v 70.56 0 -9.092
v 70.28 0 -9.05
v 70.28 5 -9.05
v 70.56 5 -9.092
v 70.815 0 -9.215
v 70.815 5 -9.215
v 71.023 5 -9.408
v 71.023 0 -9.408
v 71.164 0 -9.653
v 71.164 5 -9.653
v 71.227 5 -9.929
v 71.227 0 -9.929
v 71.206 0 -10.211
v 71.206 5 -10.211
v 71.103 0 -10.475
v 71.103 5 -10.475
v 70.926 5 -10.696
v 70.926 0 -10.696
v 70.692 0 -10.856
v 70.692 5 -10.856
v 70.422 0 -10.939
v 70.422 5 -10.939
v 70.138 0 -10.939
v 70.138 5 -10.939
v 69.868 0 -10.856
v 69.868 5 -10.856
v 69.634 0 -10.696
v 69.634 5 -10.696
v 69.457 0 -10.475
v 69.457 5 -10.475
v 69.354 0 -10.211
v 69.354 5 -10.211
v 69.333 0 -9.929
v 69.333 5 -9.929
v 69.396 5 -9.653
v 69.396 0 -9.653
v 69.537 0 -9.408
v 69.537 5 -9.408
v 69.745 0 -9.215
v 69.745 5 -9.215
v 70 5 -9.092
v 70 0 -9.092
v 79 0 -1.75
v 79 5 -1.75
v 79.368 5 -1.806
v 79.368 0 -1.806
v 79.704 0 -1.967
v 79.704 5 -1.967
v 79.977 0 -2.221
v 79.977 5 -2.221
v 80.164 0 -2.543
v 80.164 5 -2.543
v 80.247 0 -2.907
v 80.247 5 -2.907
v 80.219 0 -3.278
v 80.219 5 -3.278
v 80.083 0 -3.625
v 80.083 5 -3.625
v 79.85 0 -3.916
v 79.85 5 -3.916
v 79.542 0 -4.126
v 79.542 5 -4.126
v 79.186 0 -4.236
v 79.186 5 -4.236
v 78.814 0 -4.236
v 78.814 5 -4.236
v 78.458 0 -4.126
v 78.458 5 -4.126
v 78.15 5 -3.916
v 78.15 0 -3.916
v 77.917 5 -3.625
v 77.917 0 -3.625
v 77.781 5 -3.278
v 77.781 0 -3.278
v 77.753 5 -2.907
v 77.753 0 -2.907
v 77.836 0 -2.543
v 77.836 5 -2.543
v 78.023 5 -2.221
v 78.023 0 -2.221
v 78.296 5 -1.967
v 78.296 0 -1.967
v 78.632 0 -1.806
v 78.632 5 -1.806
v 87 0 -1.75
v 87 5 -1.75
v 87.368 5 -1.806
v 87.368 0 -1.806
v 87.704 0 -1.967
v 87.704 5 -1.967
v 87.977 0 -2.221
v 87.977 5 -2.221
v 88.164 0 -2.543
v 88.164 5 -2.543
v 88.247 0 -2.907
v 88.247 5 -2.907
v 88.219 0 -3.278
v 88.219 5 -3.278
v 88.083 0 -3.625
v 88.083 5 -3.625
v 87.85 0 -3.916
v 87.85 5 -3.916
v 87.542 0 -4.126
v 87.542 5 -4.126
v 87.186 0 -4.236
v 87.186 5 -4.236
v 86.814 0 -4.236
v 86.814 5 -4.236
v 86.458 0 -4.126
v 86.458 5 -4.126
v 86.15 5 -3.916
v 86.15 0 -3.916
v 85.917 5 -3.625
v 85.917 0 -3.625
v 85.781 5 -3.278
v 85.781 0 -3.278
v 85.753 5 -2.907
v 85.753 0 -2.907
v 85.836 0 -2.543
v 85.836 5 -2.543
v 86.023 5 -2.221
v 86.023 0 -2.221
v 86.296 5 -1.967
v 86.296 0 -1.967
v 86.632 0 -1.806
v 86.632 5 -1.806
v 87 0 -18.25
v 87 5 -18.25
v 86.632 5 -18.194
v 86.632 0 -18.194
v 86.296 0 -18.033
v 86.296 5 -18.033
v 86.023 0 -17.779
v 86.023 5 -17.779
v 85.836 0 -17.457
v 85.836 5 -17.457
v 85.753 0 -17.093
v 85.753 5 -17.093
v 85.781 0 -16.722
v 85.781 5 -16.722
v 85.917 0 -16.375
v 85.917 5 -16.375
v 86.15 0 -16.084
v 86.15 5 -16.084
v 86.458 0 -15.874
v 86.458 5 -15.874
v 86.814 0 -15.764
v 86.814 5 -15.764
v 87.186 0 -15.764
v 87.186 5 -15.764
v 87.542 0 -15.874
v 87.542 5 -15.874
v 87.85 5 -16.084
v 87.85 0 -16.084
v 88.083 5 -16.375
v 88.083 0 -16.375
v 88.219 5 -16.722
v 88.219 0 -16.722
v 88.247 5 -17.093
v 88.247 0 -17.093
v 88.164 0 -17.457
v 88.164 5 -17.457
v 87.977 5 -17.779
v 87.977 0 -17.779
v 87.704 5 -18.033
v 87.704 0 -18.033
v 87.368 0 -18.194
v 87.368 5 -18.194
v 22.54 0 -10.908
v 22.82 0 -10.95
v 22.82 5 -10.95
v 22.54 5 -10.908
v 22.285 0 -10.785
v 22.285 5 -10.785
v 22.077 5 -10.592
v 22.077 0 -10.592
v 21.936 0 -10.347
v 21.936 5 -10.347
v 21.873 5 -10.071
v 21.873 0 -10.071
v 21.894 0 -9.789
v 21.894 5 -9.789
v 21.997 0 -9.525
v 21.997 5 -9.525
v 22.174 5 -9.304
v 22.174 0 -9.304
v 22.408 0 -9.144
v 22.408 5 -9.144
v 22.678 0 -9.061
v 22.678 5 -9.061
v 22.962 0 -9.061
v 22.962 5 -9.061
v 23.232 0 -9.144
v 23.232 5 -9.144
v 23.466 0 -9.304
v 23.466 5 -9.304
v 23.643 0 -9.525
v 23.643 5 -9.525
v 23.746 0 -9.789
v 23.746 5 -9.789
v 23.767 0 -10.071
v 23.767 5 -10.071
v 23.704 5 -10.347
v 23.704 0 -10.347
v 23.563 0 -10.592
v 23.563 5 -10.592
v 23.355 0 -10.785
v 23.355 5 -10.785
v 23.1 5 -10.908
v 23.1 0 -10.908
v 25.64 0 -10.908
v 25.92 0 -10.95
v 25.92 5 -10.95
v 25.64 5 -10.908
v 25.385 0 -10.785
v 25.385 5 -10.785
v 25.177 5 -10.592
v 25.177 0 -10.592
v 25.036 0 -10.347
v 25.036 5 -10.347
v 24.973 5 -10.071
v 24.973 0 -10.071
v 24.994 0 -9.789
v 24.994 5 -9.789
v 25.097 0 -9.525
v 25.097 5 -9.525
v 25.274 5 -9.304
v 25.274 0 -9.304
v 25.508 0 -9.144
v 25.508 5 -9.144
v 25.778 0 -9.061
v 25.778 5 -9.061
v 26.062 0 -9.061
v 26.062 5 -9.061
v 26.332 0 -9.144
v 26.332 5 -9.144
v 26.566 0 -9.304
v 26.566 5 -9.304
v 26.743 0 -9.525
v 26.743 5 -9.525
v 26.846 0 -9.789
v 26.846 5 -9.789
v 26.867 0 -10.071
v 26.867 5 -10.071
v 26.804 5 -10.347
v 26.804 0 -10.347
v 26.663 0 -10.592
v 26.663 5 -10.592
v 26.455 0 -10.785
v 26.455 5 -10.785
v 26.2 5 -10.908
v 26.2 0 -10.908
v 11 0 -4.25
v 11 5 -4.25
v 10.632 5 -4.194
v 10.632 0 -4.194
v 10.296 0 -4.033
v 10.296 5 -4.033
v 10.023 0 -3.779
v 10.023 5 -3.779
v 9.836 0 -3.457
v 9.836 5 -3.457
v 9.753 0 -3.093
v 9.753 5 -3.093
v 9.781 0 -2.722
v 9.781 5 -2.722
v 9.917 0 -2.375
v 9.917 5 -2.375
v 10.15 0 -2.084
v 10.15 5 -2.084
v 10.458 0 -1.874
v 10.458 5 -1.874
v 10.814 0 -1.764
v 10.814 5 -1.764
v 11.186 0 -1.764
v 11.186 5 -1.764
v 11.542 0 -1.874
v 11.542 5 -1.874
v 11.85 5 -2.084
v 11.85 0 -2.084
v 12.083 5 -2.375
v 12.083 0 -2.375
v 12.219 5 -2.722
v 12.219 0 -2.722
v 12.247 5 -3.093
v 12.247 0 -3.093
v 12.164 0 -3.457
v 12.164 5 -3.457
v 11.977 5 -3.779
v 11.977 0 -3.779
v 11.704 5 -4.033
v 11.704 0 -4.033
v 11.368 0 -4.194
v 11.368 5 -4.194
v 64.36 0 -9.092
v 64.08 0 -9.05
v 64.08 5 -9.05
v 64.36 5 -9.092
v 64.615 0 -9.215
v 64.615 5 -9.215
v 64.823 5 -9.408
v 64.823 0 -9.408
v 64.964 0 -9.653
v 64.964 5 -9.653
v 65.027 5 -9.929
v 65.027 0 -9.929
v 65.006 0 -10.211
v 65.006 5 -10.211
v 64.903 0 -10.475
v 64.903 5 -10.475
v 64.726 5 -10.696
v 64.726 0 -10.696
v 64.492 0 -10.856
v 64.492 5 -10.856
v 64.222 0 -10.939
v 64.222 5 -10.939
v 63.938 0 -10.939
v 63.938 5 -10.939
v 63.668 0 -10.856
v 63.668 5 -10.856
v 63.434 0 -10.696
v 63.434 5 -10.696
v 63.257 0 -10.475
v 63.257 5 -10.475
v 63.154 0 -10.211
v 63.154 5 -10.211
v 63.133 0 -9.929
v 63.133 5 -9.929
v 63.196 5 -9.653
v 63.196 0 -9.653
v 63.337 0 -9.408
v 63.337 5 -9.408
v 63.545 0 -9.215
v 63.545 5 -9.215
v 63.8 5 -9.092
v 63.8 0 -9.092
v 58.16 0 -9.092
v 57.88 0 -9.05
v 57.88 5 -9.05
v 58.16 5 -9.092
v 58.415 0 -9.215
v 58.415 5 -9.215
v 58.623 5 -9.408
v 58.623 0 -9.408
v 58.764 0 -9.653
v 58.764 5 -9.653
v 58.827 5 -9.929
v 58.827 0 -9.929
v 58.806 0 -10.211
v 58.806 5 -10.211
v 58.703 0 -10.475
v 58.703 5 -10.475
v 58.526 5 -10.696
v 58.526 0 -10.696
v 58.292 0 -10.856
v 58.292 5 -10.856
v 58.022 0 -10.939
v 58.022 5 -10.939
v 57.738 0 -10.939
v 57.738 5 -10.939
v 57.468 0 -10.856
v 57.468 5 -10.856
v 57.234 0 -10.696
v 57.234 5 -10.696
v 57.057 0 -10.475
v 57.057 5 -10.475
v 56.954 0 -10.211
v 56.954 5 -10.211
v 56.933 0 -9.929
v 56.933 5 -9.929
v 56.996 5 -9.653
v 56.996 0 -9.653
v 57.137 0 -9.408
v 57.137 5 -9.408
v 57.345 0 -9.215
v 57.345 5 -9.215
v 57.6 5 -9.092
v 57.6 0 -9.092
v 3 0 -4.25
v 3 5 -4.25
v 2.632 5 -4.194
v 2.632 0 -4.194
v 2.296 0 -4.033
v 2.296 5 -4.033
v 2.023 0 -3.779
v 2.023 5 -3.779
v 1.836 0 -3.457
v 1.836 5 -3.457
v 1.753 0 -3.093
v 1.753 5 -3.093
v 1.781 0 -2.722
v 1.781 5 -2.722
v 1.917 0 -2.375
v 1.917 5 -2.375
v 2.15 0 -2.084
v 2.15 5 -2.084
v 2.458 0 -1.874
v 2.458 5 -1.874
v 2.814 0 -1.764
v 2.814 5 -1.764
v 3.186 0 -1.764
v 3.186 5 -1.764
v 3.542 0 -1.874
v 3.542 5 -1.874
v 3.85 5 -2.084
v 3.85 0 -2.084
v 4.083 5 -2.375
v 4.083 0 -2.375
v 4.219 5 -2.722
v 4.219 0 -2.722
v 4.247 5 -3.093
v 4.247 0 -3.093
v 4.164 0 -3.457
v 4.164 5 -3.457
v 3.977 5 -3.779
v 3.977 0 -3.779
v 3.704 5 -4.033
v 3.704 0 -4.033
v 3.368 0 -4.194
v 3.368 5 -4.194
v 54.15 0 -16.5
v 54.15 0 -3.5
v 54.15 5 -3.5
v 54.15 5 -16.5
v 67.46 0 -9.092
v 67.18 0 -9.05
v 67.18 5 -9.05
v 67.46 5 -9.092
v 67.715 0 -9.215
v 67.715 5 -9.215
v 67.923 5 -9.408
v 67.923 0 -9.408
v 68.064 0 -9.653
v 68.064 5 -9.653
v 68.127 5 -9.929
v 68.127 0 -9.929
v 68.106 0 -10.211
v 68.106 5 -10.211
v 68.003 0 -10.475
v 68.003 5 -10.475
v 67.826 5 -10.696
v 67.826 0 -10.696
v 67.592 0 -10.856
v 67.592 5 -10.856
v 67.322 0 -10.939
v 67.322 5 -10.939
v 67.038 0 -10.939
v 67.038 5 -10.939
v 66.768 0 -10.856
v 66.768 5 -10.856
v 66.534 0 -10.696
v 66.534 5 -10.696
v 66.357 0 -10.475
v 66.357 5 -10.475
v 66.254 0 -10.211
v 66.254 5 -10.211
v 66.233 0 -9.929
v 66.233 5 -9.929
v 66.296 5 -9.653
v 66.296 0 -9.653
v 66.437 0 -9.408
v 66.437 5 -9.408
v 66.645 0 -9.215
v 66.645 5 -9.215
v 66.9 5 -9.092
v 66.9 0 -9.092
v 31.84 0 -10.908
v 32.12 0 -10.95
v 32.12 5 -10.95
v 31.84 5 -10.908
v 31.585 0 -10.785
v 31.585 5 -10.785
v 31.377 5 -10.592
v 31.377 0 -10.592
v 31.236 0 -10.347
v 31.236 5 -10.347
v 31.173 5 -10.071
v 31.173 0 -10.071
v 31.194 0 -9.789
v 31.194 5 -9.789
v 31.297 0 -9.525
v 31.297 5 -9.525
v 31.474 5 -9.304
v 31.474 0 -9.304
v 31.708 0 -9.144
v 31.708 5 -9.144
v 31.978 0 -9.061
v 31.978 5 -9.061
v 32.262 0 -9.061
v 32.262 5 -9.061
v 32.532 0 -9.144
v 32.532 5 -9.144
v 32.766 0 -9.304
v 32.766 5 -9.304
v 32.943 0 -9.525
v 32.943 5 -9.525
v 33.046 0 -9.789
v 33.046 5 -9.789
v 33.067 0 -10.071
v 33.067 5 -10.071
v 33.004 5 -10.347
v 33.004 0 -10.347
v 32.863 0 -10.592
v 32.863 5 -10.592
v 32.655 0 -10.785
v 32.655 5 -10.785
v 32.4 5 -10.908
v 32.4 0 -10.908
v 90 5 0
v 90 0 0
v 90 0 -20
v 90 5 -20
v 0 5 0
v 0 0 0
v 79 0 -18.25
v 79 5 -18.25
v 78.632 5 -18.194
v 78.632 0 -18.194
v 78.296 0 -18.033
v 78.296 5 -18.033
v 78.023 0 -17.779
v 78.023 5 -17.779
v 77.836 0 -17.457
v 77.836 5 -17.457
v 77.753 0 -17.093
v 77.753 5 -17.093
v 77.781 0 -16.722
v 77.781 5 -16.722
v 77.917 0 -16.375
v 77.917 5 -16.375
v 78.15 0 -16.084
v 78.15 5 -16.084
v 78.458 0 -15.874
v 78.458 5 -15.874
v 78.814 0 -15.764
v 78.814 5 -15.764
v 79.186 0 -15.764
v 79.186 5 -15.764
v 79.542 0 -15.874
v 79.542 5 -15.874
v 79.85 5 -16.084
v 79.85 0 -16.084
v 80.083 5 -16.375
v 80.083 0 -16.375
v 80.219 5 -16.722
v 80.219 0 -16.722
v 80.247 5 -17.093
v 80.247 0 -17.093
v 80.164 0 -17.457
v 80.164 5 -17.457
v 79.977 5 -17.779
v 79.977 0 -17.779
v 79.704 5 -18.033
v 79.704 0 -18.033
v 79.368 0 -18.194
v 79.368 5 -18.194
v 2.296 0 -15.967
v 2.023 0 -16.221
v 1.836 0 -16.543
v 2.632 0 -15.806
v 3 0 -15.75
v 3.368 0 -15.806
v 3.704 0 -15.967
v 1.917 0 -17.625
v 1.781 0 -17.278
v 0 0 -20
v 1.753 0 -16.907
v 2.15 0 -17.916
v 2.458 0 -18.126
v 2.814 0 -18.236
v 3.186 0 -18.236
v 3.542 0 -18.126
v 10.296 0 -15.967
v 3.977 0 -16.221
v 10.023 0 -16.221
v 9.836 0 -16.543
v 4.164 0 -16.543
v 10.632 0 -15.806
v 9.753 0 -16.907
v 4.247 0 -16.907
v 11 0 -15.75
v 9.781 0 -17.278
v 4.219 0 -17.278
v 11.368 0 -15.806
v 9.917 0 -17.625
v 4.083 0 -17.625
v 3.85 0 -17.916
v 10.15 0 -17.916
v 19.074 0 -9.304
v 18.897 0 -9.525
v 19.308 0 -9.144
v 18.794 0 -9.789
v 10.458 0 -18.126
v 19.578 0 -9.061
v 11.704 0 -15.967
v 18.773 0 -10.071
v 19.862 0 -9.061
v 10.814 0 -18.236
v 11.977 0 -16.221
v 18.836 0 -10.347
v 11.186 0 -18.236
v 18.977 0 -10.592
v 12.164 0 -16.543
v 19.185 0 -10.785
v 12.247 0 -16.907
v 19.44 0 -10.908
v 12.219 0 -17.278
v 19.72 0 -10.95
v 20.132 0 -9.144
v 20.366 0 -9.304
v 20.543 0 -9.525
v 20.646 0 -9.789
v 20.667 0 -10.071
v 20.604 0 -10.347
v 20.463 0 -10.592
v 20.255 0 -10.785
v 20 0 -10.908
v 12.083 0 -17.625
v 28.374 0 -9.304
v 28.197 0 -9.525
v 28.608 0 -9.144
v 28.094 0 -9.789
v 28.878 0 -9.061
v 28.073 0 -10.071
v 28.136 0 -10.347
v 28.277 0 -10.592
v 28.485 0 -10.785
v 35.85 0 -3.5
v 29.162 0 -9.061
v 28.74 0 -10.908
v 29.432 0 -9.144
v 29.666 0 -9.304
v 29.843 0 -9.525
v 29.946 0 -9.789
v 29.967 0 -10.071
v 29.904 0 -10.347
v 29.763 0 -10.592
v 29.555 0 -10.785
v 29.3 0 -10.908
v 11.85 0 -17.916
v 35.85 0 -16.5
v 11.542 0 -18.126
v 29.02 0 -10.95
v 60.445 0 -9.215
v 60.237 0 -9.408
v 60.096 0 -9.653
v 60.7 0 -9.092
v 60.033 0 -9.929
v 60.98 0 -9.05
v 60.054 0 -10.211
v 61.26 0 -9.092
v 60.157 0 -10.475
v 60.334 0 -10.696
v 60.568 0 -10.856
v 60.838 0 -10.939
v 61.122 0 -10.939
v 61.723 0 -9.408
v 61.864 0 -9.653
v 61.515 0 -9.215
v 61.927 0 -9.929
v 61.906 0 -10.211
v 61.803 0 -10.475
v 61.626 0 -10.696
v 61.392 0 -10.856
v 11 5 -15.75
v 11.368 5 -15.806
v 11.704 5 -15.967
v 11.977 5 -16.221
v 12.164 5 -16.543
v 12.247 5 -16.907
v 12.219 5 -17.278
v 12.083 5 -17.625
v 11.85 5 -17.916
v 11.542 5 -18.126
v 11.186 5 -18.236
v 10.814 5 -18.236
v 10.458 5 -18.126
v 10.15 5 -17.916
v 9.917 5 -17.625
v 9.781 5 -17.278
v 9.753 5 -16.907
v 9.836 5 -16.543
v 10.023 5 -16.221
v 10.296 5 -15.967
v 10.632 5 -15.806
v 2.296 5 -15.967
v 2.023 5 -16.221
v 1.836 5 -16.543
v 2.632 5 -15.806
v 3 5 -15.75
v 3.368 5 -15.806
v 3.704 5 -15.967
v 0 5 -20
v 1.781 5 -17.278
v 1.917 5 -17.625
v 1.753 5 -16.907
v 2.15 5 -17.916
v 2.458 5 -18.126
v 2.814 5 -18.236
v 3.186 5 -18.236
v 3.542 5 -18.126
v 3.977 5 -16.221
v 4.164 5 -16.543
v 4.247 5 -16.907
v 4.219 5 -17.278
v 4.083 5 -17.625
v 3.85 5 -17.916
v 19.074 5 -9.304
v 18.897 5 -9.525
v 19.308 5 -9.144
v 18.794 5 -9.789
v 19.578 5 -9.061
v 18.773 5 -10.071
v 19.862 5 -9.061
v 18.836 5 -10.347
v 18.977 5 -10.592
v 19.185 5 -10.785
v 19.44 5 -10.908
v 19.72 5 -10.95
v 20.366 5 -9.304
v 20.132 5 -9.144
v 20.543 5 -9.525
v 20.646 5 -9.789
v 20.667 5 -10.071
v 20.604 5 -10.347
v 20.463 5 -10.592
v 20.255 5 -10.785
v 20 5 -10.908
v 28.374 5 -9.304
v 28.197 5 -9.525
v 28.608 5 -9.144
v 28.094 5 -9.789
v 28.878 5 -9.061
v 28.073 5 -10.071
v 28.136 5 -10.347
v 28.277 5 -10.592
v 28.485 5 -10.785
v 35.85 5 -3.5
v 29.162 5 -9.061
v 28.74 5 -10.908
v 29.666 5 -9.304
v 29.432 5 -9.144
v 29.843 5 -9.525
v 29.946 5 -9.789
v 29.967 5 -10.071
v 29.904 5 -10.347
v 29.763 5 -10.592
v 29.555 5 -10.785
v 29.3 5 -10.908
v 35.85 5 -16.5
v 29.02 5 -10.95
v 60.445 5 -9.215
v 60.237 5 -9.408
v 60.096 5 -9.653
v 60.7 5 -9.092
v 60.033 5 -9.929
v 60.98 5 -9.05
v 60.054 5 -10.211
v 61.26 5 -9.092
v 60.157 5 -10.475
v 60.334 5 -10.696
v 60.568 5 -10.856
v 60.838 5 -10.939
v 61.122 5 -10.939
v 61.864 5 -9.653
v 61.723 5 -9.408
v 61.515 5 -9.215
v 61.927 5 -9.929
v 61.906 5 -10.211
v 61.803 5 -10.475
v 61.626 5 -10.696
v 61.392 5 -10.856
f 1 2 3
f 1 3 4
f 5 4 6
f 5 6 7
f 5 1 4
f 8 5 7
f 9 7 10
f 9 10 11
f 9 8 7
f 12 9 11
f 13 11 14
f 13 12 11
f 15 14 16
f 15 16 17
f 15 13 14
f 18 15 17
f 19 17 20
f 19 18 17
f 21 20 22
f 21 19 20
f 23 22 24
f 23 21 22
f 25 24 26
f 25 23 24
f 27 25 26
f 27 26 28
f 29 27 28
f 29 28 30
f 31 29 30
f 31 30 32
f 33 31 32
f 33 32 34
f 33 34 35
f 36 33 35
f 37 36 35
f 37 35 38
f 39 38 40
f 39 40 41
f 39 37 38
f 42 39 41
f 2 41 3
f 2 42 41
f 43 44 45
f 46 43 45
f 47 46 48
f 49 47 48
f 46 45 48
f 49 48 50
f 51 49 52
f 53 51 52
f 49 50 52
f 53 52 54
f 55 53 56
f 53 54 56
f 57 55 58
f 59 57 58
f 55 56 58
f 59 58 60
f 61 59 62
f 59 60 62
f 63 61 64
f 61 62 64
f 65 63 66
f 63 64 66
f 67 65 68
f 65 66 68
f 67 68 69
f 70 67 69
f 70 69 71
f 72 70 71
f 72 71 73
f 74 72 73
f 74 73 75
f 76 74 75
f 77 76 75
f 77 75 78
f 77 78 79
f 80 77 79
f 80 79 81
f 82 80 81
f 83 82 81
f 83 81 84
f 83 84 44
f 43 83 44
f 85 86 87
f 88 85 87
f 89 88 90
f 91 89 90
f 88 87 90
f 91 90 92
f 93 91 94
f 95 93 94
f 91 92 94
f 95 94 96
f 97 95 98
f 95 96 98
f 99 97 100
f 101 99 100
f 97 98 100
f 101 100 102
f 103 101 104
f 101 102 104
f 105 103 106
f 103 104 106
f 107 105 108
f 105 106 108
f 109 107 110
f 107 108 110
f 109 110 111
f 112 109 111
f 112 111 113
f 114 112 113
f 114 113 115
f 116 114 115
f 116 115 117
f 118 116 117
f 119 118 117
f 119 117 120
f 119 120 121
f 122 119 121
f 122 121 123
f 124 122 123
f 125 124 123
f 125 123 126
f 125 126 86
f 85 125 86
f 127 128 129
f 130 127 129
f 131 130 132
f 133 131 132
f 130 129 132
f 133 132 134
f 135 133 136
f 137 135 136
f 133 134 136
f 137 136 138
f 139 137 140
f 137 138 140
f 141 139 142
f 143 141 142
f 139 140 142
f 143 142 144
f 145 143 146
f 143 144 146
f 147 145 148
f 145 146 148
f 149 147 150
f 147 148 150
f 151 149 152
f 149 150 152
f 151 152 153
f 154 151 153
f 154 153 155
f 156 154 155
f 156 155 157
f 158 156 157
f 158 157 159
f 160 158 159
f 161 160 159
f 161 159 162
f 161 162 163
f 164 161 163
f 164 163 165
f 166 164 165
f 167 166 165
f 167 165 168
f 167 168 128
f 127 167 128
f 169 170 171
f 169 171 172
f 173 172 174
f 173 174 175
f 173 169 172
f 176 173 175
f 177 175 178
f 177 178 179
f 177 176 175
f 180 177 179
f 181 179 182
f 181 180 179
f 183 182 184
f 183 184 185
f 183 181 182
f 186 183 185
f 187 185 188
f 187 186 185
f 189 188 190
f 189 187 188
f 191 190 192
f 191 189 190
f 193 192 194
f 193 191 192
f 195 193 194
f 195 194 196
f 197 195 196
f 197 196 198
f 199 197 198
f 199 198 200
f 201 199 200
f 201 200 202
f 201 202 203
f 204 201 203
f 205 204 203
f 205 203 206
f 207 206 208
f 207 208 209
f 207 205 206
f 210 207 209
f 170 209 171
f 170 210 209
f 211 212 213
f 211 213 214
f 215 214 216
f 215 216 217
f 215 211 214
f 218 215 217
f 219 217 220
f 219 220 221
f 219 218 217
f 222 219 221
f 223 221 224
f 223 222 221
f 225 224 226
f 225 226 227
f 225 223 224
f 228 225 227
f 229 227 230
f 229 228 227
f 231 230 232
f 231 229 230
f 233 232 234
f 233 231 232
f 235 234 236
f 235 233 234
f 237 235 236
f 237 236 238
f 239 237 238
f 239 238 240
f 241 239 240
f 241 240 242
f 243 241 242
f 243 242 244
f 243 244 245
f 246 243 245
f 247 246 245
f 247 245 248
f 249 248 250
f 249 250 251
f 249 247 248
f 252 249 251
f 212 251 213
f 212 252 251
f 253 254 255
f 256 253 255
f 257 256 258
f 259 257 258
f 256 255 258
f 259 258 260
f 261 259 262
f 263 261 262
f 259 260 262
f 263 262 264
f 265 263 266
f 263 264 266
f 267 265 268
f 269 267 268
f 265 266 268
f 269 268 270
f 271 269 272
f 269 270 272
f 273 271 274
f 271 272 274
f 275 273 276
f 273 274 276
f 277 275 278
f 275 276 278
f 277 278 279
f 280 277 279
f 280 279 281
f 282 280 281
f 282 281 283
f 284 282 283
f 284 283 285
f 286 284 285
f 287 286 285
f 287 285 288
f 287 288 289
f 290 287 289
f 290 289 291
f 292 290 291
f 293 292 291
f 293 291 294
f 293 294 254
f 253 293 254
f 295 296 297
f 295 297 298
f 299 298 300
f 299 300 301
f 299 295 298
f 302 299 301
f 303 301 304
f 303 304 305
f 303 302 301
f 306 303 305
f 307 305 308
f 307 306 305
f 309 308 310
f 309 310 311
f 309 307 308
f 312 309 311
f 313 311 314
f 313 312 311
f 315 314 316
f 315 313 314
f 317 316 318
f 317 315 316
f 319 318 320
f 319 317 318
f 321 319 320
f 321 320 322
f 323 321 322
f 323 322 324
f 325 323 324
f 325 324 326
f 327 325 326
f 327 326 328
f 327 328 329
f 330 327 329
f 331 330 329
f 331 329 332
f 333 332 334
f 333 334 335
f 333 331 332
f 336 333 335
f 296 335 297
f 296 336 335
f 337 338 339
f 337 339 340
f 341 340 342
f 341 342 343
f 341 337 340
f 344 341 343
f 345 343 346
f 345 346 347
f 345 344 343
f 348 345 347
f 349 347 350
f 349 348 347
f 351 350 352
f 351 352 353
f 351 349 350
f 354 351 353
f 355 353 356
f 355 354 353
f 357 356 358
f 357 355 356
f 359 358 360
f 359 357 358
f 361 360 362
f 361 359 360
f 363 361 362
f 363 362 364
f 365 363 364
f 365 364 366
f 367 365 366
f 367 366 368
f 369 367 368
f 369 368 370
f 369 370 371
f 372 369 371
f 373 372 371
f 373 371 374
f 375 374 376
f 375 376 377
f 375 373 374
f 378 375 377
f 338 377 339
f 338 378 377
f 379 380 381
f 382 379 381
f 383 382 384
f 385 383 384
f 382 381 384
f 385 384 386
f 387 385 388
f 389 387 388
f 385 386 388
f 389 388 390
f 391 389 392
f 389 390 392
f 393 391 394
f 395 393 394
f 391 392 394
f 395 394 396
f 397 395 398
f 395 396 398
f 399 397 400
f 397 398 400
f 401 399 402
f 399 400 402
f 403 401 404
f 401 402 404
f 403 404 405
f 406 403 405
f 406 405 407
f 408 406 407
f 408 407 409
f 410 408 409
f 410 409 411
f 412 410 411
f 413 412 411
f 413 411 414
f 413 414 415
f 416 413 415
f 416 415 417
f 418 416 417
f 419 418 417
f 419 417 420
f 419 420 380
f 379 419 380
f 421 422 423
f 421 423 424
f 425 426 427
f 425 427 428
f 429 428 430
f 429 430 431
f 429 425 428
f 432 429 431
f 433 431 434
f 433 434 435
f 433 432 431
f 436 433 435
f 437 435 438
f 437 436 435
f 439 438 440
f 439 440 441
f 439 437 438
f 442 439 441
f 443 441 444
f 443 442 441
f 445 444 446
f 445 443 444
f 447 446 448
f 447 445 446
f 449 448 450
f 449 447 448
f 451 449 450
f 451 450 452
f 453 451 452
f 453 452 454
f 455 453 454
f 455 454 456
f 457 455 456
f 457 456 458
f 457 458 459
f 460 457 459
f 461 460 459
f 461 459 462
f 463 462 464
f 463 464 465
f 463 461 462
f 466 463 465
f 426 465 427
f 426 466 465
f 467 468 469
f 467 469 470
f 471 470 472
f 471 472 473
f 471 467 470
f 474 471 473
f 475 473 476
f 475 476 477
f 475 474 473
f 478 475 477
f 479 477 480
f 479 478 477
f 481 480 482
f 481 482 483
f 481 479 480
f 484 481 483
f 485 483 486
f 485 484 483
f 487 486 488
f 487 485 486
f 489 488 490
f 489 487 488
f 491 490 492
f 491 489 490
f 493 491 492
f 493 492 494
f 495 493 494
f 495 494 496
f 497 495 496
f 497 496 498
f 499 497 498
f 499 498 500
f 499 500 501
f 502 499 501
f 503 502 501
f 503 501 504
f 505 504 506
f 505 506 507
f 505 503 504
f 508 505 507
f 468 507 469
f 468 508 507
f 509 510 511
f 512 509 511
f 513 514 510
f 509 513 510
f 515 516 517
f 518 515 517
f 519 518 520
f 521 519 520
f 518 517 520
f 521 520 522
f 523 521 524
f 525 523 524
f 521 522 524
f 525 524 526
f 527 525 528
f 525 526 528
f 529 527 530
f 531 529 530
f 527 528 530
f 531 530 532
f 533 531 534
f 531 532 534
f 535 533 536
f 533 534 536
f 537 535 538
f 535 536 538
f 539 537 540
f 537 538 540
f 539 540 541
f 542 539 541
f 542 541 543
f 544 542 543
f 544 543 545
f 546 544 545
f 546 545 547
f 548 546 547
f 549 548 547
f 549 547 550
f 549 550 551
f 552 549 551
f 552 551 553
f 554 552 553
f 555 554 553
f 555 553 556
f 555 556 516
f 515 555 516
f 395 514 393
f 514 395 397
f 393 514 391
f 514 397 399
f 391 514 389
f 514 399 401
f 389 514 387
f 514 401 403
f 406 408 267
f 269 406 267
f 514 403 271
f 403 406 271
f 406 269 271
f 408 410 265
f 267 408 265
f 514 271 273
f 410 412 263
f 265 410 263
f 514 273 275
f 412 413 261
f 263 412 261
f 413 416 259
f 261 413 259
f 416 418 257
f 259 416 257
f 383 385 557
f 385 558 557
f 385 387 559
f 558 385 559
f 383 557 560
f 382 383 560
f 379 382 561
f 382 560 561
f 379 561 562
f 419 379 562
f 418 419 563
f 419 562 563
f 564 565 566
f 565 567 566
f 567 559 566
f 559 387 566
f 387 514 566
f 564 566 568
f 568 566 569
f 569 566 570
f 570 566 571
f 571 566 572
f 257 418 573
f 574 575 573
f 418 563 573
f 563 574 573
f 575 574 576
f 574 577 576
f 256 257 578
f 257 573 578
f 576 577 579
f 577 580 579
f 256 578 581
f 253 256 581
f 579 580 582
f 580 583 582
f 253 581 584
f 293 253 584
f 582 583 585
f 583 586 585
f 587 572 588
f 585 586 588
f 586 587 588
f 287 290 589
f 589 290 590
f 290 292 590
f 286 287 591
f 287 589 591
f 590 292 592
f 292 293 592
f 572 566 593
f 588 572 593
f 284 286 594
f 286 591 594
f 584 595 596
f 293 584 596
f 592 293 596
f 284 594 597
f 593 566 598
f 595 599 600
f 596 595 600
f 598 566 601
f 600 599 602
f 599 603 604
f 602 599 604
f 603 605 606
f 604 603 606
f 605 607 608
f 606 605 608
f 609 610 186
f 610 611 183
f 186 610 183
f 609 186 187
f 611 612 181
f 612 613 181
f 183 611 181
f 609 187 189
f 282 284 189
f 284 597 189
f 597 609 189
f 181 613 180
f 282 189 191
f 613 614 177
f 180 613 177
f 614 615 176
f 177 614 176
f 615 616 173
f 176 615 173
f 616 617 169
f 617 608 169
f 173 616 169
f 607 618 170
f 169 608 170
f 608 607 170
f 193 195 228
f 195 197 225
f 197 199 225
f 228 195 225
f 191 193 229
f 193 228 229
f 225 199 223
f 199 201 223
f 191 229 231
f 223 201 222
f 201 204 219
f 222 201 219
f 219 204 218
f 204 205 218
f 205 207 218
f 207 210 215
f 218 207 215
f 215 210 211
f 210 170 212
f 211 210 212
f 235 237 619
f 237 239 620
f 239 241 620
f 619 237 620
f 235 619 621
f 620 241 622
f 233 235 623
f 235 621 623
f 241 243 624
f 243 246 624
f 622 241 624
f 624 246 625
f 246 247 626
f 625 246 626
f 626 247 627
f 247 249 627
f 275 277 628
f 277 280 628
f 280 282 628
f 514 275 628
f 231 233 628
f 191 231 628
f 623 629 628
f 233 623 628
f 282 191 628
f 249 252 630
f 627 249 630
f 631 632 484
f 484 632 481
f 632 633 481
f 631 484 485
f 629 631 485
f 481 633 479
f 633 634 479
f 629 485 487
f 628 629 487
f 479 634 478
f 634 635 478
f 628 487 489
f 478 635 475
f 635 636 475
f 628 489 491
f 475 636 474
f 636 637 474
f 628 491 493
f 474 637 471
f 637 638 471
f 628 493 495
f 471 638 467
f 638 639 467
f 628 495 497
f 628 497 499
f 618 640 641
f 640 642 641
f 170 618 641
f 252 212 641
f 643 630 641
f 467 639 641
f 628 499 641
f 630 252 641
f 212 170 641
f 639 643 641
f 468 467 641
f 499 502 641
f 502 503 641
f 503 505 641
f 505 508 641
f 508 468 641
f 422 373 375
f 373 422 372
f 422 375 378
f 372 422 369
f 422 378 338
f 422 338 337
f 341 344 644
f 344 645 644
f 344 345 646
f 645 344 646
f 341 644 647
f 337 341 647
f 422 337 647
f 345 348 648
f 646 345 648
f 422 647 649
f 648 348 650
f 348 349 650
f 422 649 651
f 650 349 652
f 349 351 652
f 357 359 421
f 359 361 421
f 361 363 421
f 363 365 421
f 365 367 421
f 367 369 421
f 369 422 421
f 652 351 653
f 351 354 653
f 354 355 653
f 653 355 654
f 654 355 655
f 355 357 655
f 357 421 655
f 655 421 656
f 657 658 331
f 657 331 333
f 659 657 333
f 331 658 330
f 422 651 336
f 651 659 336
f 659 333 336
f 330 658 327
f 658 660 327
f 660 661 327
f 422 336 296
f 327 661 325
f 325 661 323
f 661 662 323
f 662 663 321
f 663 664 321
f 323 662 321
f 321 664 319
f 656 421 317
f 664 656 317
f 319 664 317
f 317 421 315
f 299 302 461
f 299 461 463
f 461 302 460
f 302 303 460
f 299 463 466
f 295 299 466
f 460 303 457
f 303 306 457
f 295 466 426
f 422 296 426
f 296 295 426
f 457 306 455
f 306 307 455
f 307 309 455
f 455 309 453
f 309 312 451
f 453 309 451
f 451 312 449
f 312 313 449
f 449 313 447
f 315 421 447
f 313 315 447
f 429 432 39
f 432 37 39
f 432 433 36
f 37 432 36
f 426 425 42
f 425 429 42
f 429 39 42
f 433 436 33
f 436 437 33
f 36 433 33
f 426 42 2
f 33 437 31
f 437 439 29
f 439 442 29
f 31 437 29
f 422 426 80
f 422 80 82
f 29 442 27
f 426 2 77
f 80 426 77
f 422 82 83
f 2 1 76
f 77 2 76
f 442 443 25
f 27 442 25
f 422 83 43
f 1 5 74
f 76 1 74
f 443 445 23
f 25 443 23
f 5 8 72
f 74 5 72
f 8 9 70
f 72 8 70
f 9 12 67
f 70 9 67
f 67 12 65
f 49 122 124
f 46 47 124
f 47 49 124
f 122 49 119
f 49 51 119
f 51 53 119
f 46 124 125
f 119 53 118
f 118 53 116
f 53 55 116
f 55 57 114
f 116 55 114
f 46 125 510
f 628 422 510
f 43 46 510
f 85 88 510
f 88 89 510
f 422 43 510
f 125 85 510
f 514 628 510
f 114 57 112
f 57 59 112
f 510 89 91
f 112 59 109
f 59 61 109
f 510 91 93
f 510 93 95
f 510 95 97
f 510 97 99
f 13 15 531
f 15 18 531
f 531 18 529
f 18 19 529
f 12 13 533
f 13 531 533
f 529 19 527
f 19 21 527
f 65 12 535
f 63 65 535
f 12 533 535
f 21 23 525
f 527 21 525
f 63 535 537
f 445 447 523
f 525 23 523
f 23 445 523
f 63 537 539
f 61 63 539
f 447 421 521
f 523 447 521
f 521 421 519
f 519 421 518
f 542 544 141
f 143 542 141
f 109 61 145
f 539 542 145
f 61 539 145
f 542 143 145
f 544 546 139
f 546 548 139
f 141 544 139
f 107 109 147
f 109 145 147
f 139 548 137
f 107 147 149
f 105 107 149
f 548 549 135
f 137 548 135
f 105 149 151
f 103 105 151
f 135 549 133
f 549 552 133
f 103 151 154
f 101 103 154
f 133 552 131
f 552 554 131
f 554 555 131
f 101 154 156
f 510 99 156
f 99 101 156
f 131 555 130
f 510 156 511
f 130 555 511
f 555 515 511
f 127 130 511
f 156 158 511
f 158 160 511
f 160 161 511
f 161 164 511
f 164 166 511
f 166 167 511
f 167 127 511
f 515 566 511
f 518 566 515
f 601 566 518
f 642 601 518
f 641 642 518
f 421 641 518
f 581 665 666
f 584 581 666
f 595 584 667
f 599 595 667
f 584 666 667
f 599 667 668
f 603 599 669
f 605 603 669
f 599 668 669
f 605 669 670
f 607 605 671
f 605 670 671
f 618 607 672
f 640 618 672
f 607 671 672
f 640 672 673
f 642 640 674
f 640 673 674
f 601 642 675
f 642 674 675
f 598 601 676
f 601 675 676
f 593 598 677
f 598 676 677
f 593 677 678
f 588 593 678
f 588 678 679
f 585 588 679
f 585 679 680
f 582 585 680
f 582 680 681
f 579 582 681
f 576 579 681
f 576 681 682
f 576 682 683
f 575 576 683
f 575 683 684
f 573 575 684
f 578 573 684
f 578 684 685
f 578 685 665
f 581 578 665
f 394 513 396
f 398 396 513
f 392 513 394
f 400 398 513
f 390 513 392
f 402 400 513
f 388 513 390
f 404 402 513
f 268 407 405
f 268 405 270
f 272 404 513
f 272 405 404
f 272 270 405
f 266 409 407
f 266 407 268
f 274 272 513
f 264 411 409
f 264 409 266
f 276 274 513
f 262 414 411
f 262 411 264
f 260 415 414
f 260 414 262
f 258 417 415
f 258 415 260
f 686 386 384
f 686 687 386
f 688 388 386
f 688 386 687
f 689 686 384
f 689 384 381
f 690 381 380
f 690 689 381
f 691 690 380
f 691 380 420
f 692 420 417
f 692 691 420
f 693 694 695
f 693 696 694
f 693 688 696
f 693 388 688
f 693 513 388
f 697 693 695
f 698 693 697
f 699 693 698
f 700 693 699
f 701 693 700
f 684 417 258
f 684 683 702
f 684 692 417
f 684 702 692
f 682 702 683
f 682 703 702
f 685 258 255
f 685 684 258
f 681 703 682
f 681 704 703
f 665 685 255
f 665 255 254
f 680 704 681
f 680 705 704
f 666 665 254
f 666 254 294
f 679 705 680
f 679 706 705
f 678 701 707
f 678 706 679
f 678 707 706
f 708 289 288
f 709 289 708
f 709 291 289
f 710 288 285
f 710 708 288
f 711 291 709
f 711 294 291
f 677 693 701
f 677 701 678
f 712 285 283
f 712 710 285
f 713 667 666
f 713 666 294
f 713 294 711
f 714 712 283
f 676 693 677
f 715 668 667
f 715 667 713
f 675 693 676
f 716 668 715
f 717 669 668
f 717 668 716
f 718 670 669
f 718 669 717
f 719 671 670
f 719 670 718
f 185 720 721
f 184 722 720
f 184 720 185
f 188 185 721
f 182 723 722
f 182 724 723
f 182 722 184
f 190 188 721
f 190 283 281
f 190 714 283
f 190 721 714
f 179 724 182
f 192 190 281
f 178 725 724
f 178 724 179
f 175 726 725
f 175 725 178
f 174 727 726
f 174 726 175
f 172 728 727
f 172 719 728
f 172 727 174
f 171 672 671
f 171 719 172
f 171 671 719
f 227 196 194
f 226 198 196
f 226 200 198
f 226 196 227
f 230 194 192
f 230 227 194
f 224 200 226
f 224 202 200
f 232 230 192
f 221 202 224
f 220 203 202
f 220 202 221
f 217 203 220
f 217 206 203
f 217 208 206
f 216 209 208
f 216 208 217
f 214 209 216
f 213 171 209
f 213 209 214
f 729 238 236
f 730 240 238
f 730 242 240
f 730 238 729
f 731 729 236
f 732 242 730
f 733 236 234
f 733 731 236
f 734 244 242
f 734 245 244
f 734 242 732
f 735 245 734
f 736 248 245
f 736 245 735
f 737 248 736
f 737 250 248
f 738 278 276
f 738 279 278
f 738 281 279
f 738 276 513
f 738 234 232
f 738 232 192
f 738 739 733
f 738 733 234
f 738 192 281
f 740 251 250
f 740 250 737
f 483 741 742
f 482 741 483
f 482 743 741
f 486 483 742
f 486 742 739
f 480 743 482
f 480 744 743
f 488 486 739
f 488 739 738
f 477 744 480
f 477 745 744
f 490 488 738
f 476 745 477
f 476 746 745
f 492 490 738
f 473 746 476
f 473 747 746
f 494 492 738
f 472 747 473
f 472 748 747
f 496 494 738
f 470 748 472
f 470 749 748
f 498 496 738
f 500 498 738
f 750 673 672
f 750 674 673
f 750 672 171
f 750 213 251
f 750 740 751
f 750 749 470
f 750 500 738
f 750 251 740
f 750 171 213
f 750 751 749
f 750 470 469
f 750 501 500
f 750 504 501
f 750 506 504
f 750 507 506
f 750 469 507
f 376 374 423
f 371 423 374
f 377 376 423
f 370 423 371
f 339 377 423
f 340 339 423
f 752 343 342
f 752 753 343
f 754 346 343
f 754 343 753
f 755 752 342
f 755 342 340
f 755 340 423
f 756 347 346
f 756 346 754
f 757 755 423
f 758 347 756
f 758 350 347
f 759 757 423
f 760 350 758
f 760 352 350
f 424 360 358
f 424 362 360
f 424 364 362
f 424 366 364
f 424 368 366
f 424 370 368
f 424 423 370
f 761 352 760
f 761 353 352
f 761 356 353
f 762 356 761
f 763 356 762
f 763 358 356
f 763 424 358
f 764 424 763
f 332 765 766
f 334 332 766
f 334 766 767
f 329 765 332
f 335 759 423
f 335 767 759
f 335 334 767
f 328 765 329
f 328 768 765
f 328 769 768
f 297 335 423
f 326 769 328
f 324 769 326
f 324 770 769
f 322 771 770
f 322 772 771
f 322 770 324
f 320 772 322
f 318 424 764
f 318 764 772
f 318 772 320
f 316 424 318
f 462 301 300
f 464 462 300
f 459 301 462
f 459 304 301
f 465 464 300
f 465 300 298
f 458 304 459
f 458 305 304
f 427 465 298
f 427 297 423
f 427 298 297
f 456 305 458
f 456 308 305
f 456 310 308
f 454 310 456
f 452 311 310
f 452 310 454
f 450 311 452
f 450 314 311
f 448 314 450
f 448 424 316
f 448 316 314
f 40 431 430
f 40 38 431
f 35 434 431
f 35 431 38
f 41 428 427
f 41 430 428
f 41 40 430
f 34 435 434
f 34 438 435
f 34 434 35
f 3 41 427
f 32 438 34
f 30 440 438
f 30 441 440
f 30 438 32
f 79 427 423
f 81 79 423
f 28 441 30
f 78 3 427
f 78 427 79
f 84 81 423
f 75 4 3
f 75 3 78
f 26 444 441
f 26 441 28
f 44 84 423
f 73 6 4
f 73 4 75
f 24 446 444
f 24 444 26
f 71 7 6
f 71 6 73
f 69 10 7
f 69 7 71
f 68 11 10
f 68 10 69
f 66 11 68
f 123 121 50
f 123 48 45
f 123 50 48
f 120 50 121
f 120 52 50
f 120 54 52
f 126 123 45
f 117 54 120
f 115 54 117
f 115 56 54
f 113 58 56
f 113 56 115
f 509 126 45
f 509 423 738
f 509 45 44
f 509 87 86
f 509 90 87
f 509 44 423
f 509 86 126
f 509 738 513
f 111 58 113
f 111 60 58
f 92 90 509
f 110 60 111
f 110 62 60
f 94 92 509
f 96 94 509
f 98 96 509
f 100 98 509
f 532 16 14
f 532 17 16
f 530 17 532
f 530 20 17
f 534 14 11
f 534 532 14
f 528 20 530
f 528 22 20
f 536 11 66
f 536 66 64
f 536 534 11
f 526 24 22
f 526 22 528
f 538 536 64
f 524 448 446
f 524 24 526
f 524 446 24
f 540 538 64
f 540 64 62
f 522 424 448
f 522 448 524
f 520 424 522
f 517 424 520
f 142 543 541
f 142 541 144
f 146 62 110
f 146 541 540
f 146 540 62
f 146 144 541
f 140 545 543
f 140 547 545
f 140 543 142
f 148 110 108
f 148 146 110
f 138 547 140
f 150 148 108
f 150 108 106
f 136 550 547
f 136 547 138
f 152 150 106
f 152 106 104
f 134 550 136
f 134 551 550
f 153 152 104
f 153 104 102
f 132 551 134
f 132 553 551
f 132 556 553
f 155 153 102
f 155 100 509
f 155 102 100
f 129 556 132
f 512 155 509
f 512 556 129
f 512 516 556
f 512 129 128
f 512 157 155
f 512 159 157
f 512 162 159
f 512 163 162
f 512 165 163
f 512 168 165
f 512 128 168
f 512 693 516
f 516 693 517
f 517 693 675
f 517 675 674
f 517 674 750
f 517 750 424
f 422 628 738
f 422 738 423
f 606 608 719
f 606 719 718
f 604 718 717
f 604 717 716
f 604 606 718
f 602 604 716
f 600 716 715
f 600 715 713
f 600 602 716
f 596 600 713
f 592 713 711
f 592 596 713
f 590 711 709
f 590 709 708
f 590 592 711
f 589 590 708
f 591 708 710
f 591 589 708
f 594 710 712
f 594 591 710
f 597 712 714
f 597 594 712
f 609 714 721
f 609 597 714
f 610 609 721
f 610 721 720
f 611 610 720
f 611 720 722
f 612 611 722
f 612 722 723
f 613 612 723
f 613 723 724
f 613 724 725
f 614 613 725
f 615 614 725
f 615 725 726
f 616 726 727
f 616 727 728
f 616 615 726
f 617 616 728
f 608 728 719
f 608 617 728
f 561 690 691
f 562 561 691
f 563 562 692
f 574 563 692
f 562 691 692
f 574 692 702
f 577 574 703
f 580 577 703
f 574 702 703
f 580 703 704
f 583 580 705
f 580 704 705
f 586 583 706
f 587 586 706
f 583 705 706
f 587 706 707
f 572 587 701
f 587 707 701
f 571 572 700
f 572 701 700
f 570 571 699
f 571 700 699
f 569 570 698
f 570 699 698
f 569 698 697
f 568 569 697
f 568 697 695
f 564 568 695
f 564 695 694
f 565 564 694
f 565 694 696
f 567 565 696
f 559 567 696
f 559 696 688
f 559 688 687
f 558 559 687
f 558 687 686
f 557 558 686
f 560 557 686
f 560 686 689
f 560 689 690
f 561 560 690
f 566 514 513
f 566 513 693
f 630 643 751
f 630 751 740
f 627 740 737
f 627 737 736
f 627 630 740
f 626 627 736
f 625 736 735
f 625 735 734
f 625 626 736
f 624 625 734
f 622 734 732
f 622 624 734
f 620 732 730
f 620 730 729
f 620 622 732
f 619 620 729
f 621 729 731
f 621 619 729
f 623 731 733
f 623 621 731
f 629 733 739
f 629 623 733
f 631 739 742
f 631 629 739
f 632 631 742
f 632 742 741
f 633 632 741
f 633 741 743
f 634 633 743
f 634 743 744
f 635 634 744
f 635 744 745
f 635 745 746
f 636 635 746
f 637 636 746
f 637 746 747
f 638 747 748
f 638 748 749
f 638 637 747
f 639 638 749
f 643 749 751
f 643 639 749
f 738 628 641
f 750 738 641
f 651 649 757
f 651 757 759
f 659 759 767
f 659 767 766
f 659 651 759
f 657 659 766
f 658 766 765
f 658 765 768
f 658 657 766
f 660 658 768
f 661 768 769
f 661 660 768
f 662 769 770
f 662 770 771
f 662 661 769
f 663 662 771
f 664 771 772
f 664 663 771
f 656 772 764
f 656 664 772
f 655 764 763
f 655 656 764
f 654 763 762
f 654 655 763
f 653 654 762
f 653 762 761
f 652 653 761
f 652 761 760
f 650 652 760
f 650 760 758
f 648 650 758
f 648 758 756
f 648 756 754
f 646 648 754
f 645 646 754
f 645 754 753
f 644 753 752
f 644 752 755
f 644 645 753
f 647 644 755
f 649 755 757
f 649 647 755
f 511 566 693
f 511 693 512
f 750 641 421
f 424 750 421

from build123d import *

# Parameters (mm, degrees)
SKETCH1_W           = 90
SKETCH1_H           = 20
SKETCH1_R           = 0.95
SKETCH1_W_2         = 18.3
SKETCH1_H_2         = 13
BOSS_EXTRUDE1_DEPTH = 5
CUT_EXTRUDE1_REACH  = 94.331
SKETCH3_R           = 1.25


with BuildPart() as part:
    # Sketch1 → Boss-Extrude1 (new body)
    with BuildSketch(Plane(origin=(0, 0, 0), x_dir=(1, 0, 0), z_dir=(0, 1, 0))):
        with Locations((45, 10)):
            Rectangle(SKETCH1_W, SKETCH1_H)
        with Locations(Location((57.88, 10, 0), (0, 0, 270))):
            Circle(SKETCH1_R, mode=Mode.SUBTRACT)
        with Locations(Location((60.98, 10, 0), (0, 0, 270))):
            Circle(SKETCH1_R, mode=Mode.SUBTRACT)
        with Locations(Location((64.08, 10, 0), (0, 0, 270))):
            Circle(SKETCH1_R, mode=Mode.SUBTRACT)
        with Locations(Location((67.18, 10, 0), (0, 0, 270))):
            Circle(SKETCH1_R, mode=Mode.SUBTRACT)
        with Locations(Location((70.28, 10, 0), (0, 0, 270))):
            Circle(SKETCH1_R, mode=Mode.SUBTRACT)
        with Locations(Location((19.72, 10, 0), (0, 0, 90))):
            Circle(SKETCH1_R, mode=Mode.SUBTRACT)
        with Locations(Location((22.82, 10, 0), (0, 0, 90))):
            Circle(SKETCH1_R, mode=Mode.SUBTRACT)
        with Locations(Location((25.92, 10, 0), (0, 0, 90))):
            Circle(SKETCH1_R, mode=Mode.SUBTRACT)
        with Locations(Location((29.02, 10, 0), (0, 0, 90))):
            Circle(SKETCH1_R, mode=Mode.SUBTRACT)
        with Locations(Location((32.12, 10, 0), (0, 0, 90))):
            Circle(SKETCH1_R, mode=Mode.SUBTRACT)
        with Locations((45, 10)):
            Rectangle(SKETCH1_W_2, SKETCH1_H_2, mode=Mode.SUBTRACT)
    extrude(amount=BOSS_EXTRUDE1_DEPTH)

    # Sketch3 → Cut-Extrude1 (cut, up to next)
    with BuildSketch(Plane(origin=(0, 5, 0), x_dir=(1, 0, 0), z_dir=(0, 1, 0)), mode=Mode.PRIVATE) as cut_extrude1_sk1:
        with Locations(Location((87, 3, 0), (0, 0, 270))):
            Circle(SKETCH3_R)
    cut_extrude1_tool1 = extrude(cut_extrude1_sk1.sketch, amount=-CUT_EXTRUDE1_REACH, mode=Mode.PRIVATE) & part.part
    # Sketch3 → Cut-Extrude1 (cut, up to next)
    with BuildSketch(Plane(origin=(0, 5, 0), x_dir=(1, 0, 0), z_dir=(0, 1, 0)), mode=Mode.PRIVATE) as cut_extrude1_sk2:
        with Locations(Location((79, 3, 0), (0, 0, 270))):
            Circle(SKETCH3_R)
    cut_extrude1_tool2 = extrude(cut_extrude1_sk2.sketch, amount=-CUT_EXTRUDE1_REACH, mode=Mode.PRIVATE) & part.part
    # Sketch3 → Cut-Extrude1 (cut, up to next)
    with BuildSketch(Plane(origin=(0, 5, 0), x_dir=(1, 0, 0), z_dir=(0, 1, 0)), mode=Mode.PRIVATE) as cut_extrude1_sk3:
        with Locations(Location((79, 17, 0), (0, 0, 90))):
            Circle(SKETCH3_R)
    cut_extrude1_tool3 = extrude(cut_extrude1_sk3.sketch, amount=-CUT_EXTRUDE1_REACH, mode=Mode.PRIVATE) & part.part
    # Sketch3 → Cut-Extrude1 (cut, up to next)
    with BuildSketch(Plane(origin=(0, 5, 0), x_dir=(1, 0, 0), z_dir=(0, 1, 0)), mode=Mode.PRIVATE) as cut_extrude1_sk4:
        with Locations(Location((87, 17, 0), (0, 0, 90))):
            Circle(SKETCH3_R)
    cut_extrude1_tool4 = extrude(cut_extrude1_sk4.sketch, amount=-CUT_EXTRUDE1_REACH, mode=Mode.PRIVATE) & part.part
    # Sketch3 → Cut-Extrude1 (cut, up to next)
    with BuildSketch(Plane(origin=(0, 5, 0), x_dir=(1, 0, 0), z_dir=(0, 1, 0)), mode=Mode.PRIVATE) as cut_extrude1_sk5:
        with Locations(Location((3, 17, 0), (0, 0, 270))):
            Circle(SKETCH3_R)
    cut_extrude1_tool5 = extrude(cut_extrude1_sk5.sketch, amount=-CUT_EXTRUDE1_REACH, mode=Mode.PRIVATE) & part.part
    # Sketch3 → Cut-Extrude1 (cut, up to next)
    with BuildSketch(Plane(origin=(0, 5, 0), x_dir=(1, 0, 0), z_dir=(0, 1, 0)), mode=Mode.PRIVATE) as cut_extrude1_sk6:
        with Locations(Location((11, 17, 0), (0, 0, 270))):
            Circle(SKETCH3_R)
    cut_extrude1_tool6 = extrude(cut_extrude1_sk6.sketch, amount=-CUT_EXTRUDE1_REACH, mode=Mode.PRIVATE) & part.part
    # Sketch3 → Cut-Extrude1 (cut, up to next)
    with BuildSketch(Plane(origin=(0, 5, 0), x_dir=(1, 0, 0), z_dir=(0, 1, 0)), mode=Mode.PRIVATE) as cut_extrude1_sk7:
        with Locations(Location((11, 3, 0), (0, 0, 90))):
            Circle(SKETCH3_R)
    cut_extrude1_tool7 = extrude(cut_extrude1_sk7.sketch, amount=-CUT_EXTRUDE1_REACH, mode=Mode.PRIVATE) & part.part
    # Sketch3 → Cut-Extrude1 (cut, up to next)
    with BuildSketch(Plane(origin=(0, 5, 0), x_dir=(1, 0, 0), z_dir=(0, 1, 0)), mode=Mode.PRIVATE) as cut_extrude1_sk8:
        with Locations(Location((3, 3, 0), (0, 0, 90))):
            Circle(SKETCH3_R)
    cut_extrude1_tool8 = extrude(cut_extrude1_sk8.sketch, amount=-CUT_EXTRUDE1_REACH, mode=Mode.PRIVATE) & part.part
    add(cut_extrude1_tool1.solids().sort_by_distance((87, 5, -3))[0], mode=Mode.SUBTRACT)
    add(cut_extrude1_tool2.solids().sort_by_distance((79, 5, -3))[0], mode=Mode.SUBTRACT)
    add(cut_extrude1_tool3.solids().sort_by_distance((79, 5, -17))[0], mode=Mode.SUBTRACT)
    add(cut_extrude1_tool4.solids().sort_by_distance((87, 5, -17))[0], mode=Mode.SUBTRACT)
    add(cut_extrude1_tool5.solids().sort_by_distance((3, 5, -17))[0], mode=Mode.SUBTRACT)
    add(cut_extrude1_tool6.solids().sort_by_distance((11, 5, -17))[0], mode=Mode.SUBTRACT)
    add(cut_extrude1_tool7.solids().sort_by_distance((11, 5, -3))[0], mode=Mode.SUBTRACT)
    add(cut_extrude1_tool8.solids().sort_by_distance((3, 5, -3))[0], mode=Mode.SUBTRACT)


solid = part.part
